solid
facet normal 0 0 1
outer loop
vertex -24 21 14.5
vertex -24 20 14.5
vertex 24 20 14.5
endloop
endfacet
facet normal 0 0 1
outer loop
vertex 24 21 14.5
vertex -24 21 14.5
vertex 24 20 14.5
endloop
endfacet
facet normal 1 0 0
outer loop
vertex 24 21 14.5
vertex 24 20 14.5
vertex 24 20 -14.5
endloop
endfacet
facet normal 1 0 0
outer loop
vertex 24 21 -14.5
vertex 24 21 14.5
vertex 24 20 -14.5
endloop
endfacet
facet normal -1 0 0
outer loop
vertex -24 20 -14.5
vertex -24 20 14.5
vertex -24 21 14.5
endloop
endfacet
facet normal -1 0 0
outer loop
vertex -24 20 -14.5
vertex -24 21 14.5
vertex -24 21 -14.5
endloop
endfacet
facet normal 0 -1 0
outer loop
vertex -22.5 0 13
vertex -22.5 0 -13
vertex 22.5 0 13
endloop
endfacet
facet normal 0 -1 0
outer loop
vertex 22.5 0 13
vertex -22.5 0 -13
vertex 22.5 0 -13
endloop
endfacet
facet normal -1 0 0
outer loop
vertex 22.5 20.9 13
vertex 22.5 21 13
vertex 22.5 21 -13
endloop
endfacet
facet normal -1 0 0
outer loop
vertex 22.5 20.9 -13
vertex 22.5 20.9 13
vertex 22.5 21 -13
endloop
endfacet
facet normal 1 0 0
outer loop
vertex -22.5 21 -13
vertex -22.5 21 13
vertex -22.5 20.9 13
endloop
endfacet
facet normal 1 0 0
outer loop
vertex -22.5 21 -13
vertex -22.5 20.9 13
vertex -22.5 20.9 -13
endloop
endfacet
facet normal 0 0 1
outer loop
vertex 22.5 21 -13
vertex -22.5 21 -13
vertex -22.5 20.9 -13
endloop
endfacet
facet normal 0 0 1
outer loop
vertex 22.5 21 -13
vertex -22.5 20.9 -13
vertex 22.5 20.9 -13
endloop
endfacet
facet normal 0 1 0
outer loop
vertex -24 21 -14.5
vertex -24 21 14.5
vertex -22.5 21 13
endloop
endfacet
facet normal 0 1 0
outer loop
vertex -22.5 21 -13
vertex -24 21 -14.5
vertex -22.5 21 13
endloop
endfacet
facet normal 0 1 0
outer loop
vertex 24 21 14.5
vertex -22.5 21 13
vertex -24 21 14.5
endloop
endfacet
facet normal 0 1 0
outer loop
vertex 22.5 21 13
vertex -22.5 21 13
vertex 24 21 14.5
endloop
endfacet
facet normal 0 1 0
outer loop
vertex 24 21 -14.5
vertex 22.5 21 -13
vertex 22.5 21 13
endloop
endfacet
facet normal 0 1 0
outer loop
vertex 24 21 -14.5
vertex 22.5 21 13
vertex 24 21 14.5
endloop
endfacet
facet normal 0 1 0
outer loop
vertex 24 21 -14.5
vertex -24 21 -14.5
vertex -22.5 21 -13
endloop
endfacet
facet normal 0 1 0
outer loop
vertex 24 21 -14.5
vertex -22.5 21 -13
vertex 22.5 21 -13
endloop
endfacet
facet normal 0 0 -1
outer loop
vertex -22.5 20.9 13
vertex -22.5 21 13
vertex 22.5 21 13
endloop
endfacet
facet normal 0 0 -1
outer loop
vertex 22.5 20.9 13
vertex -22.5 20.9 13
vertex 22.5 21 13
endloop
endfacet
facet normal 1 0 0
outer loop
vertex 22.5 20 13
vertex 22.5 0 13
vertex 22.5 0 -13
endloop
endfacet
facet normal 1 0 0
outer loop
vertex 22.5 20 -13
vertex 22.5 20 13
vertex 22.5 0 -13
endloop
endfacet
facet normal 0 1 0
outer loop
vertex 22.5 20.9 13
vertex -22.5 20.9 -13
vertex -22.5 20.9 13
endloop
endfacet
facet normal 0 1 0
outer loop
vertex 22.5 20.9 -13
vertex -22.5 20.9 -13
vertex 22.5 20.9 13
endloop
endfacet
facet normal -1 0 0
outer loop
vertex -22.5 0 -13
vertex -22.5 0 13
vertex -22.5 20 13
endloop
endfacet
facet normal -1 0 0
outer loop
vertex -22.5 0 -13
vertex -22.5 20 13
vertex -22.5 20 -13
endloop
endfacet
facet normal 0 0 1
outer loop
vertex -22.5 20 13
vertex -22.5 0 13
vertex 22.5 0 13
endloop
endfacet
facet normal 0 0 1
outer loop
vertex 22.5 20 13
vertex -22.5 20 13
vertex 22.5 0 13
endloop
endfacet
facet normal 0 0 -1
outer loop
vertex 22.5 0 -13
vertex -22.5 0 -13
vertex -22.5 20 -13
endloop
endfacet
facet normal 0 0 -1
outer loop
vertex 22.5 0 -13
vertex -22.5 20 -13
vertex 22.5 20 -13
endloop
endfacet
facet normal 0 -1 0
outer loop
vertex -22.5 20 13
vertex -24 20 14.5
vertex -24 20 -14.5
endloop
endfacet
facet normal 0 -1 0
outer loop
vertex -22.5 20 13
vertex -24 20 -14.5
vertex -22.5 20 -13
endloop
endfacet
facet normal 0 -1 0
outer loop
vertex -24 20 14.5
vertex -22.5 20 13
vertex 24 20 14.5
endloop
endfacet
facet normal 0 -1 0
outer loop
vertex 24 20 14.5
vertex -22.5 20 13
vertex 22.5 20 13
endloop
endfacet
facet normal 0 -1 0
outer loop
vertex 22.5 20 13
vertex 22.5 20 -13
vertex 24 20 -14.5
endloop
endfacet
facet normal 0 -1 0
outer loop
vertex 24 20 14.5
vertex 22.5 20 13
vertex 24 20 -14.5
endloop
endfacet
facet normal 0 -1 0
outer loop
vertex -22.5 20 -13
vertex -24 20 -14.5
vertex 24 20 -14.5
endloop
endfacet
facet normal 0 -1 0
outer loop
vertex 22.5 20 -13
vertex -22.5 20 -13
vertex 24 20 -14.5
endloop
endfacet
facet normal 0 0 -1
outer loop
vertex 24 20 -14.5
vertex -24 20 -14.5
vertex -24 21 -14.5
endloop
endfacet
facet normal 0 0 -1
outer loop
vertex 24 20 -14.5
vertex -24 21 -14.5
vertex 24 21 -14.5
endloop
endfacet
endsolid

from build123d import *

# Parameters (mm, degrees)
SKETCH_1_W          = 45
SKETCH_1_H          = 26
EXTRUDE_4_DEPTH     = 20
SKETCH_3_W          = 48
SKETCH_3_H          = 29
EXTRUDE_5_DEPTH     = 1
SKETCH_4_W          = 45
SKETCH_4_H          = 26
CUT_EXTRUDE_1_DEPTH = 0.1


with BuildPart() as part:
    # 草图1 → 凸台-拉伸4 (new body)
    with BuildSketch(Plane(origin=(0, 0, 0), x_dir=(1, 0, 0), z_dir=(0, 1, 0))):
        Rectangle(SKETCH_1_W, SKETCH_1_H)
    extrude(amount=EXTRUDE_4_DEPTH)

    # 草图3 → 凸台-拉伸5 (add)
    with BuildSketch(Plane(origin=(0, 20, 0), x_dir=(1, 0, 0), z_dir=(0, 1, 0))):
        Rectangle(SKETCH_3_W, SKETCH_3_H)
    extrude(amount=EXTRUDE_5_DEPTH)

    # 草图4 → 切除-拉伸1 (cut)
    with BuildSketch(Plane(origin=(0, 21, 0), x_dir=(1, 0, 0), z_dir=(0, 1, 0))):
        Rectangle(SKETCH_4_W, SKETCH_4_H)
    extrude(amount=-CUT_EXTRUDE_1_DEPTH, mode=Mode.SUBTRACT)


solid = part.part
